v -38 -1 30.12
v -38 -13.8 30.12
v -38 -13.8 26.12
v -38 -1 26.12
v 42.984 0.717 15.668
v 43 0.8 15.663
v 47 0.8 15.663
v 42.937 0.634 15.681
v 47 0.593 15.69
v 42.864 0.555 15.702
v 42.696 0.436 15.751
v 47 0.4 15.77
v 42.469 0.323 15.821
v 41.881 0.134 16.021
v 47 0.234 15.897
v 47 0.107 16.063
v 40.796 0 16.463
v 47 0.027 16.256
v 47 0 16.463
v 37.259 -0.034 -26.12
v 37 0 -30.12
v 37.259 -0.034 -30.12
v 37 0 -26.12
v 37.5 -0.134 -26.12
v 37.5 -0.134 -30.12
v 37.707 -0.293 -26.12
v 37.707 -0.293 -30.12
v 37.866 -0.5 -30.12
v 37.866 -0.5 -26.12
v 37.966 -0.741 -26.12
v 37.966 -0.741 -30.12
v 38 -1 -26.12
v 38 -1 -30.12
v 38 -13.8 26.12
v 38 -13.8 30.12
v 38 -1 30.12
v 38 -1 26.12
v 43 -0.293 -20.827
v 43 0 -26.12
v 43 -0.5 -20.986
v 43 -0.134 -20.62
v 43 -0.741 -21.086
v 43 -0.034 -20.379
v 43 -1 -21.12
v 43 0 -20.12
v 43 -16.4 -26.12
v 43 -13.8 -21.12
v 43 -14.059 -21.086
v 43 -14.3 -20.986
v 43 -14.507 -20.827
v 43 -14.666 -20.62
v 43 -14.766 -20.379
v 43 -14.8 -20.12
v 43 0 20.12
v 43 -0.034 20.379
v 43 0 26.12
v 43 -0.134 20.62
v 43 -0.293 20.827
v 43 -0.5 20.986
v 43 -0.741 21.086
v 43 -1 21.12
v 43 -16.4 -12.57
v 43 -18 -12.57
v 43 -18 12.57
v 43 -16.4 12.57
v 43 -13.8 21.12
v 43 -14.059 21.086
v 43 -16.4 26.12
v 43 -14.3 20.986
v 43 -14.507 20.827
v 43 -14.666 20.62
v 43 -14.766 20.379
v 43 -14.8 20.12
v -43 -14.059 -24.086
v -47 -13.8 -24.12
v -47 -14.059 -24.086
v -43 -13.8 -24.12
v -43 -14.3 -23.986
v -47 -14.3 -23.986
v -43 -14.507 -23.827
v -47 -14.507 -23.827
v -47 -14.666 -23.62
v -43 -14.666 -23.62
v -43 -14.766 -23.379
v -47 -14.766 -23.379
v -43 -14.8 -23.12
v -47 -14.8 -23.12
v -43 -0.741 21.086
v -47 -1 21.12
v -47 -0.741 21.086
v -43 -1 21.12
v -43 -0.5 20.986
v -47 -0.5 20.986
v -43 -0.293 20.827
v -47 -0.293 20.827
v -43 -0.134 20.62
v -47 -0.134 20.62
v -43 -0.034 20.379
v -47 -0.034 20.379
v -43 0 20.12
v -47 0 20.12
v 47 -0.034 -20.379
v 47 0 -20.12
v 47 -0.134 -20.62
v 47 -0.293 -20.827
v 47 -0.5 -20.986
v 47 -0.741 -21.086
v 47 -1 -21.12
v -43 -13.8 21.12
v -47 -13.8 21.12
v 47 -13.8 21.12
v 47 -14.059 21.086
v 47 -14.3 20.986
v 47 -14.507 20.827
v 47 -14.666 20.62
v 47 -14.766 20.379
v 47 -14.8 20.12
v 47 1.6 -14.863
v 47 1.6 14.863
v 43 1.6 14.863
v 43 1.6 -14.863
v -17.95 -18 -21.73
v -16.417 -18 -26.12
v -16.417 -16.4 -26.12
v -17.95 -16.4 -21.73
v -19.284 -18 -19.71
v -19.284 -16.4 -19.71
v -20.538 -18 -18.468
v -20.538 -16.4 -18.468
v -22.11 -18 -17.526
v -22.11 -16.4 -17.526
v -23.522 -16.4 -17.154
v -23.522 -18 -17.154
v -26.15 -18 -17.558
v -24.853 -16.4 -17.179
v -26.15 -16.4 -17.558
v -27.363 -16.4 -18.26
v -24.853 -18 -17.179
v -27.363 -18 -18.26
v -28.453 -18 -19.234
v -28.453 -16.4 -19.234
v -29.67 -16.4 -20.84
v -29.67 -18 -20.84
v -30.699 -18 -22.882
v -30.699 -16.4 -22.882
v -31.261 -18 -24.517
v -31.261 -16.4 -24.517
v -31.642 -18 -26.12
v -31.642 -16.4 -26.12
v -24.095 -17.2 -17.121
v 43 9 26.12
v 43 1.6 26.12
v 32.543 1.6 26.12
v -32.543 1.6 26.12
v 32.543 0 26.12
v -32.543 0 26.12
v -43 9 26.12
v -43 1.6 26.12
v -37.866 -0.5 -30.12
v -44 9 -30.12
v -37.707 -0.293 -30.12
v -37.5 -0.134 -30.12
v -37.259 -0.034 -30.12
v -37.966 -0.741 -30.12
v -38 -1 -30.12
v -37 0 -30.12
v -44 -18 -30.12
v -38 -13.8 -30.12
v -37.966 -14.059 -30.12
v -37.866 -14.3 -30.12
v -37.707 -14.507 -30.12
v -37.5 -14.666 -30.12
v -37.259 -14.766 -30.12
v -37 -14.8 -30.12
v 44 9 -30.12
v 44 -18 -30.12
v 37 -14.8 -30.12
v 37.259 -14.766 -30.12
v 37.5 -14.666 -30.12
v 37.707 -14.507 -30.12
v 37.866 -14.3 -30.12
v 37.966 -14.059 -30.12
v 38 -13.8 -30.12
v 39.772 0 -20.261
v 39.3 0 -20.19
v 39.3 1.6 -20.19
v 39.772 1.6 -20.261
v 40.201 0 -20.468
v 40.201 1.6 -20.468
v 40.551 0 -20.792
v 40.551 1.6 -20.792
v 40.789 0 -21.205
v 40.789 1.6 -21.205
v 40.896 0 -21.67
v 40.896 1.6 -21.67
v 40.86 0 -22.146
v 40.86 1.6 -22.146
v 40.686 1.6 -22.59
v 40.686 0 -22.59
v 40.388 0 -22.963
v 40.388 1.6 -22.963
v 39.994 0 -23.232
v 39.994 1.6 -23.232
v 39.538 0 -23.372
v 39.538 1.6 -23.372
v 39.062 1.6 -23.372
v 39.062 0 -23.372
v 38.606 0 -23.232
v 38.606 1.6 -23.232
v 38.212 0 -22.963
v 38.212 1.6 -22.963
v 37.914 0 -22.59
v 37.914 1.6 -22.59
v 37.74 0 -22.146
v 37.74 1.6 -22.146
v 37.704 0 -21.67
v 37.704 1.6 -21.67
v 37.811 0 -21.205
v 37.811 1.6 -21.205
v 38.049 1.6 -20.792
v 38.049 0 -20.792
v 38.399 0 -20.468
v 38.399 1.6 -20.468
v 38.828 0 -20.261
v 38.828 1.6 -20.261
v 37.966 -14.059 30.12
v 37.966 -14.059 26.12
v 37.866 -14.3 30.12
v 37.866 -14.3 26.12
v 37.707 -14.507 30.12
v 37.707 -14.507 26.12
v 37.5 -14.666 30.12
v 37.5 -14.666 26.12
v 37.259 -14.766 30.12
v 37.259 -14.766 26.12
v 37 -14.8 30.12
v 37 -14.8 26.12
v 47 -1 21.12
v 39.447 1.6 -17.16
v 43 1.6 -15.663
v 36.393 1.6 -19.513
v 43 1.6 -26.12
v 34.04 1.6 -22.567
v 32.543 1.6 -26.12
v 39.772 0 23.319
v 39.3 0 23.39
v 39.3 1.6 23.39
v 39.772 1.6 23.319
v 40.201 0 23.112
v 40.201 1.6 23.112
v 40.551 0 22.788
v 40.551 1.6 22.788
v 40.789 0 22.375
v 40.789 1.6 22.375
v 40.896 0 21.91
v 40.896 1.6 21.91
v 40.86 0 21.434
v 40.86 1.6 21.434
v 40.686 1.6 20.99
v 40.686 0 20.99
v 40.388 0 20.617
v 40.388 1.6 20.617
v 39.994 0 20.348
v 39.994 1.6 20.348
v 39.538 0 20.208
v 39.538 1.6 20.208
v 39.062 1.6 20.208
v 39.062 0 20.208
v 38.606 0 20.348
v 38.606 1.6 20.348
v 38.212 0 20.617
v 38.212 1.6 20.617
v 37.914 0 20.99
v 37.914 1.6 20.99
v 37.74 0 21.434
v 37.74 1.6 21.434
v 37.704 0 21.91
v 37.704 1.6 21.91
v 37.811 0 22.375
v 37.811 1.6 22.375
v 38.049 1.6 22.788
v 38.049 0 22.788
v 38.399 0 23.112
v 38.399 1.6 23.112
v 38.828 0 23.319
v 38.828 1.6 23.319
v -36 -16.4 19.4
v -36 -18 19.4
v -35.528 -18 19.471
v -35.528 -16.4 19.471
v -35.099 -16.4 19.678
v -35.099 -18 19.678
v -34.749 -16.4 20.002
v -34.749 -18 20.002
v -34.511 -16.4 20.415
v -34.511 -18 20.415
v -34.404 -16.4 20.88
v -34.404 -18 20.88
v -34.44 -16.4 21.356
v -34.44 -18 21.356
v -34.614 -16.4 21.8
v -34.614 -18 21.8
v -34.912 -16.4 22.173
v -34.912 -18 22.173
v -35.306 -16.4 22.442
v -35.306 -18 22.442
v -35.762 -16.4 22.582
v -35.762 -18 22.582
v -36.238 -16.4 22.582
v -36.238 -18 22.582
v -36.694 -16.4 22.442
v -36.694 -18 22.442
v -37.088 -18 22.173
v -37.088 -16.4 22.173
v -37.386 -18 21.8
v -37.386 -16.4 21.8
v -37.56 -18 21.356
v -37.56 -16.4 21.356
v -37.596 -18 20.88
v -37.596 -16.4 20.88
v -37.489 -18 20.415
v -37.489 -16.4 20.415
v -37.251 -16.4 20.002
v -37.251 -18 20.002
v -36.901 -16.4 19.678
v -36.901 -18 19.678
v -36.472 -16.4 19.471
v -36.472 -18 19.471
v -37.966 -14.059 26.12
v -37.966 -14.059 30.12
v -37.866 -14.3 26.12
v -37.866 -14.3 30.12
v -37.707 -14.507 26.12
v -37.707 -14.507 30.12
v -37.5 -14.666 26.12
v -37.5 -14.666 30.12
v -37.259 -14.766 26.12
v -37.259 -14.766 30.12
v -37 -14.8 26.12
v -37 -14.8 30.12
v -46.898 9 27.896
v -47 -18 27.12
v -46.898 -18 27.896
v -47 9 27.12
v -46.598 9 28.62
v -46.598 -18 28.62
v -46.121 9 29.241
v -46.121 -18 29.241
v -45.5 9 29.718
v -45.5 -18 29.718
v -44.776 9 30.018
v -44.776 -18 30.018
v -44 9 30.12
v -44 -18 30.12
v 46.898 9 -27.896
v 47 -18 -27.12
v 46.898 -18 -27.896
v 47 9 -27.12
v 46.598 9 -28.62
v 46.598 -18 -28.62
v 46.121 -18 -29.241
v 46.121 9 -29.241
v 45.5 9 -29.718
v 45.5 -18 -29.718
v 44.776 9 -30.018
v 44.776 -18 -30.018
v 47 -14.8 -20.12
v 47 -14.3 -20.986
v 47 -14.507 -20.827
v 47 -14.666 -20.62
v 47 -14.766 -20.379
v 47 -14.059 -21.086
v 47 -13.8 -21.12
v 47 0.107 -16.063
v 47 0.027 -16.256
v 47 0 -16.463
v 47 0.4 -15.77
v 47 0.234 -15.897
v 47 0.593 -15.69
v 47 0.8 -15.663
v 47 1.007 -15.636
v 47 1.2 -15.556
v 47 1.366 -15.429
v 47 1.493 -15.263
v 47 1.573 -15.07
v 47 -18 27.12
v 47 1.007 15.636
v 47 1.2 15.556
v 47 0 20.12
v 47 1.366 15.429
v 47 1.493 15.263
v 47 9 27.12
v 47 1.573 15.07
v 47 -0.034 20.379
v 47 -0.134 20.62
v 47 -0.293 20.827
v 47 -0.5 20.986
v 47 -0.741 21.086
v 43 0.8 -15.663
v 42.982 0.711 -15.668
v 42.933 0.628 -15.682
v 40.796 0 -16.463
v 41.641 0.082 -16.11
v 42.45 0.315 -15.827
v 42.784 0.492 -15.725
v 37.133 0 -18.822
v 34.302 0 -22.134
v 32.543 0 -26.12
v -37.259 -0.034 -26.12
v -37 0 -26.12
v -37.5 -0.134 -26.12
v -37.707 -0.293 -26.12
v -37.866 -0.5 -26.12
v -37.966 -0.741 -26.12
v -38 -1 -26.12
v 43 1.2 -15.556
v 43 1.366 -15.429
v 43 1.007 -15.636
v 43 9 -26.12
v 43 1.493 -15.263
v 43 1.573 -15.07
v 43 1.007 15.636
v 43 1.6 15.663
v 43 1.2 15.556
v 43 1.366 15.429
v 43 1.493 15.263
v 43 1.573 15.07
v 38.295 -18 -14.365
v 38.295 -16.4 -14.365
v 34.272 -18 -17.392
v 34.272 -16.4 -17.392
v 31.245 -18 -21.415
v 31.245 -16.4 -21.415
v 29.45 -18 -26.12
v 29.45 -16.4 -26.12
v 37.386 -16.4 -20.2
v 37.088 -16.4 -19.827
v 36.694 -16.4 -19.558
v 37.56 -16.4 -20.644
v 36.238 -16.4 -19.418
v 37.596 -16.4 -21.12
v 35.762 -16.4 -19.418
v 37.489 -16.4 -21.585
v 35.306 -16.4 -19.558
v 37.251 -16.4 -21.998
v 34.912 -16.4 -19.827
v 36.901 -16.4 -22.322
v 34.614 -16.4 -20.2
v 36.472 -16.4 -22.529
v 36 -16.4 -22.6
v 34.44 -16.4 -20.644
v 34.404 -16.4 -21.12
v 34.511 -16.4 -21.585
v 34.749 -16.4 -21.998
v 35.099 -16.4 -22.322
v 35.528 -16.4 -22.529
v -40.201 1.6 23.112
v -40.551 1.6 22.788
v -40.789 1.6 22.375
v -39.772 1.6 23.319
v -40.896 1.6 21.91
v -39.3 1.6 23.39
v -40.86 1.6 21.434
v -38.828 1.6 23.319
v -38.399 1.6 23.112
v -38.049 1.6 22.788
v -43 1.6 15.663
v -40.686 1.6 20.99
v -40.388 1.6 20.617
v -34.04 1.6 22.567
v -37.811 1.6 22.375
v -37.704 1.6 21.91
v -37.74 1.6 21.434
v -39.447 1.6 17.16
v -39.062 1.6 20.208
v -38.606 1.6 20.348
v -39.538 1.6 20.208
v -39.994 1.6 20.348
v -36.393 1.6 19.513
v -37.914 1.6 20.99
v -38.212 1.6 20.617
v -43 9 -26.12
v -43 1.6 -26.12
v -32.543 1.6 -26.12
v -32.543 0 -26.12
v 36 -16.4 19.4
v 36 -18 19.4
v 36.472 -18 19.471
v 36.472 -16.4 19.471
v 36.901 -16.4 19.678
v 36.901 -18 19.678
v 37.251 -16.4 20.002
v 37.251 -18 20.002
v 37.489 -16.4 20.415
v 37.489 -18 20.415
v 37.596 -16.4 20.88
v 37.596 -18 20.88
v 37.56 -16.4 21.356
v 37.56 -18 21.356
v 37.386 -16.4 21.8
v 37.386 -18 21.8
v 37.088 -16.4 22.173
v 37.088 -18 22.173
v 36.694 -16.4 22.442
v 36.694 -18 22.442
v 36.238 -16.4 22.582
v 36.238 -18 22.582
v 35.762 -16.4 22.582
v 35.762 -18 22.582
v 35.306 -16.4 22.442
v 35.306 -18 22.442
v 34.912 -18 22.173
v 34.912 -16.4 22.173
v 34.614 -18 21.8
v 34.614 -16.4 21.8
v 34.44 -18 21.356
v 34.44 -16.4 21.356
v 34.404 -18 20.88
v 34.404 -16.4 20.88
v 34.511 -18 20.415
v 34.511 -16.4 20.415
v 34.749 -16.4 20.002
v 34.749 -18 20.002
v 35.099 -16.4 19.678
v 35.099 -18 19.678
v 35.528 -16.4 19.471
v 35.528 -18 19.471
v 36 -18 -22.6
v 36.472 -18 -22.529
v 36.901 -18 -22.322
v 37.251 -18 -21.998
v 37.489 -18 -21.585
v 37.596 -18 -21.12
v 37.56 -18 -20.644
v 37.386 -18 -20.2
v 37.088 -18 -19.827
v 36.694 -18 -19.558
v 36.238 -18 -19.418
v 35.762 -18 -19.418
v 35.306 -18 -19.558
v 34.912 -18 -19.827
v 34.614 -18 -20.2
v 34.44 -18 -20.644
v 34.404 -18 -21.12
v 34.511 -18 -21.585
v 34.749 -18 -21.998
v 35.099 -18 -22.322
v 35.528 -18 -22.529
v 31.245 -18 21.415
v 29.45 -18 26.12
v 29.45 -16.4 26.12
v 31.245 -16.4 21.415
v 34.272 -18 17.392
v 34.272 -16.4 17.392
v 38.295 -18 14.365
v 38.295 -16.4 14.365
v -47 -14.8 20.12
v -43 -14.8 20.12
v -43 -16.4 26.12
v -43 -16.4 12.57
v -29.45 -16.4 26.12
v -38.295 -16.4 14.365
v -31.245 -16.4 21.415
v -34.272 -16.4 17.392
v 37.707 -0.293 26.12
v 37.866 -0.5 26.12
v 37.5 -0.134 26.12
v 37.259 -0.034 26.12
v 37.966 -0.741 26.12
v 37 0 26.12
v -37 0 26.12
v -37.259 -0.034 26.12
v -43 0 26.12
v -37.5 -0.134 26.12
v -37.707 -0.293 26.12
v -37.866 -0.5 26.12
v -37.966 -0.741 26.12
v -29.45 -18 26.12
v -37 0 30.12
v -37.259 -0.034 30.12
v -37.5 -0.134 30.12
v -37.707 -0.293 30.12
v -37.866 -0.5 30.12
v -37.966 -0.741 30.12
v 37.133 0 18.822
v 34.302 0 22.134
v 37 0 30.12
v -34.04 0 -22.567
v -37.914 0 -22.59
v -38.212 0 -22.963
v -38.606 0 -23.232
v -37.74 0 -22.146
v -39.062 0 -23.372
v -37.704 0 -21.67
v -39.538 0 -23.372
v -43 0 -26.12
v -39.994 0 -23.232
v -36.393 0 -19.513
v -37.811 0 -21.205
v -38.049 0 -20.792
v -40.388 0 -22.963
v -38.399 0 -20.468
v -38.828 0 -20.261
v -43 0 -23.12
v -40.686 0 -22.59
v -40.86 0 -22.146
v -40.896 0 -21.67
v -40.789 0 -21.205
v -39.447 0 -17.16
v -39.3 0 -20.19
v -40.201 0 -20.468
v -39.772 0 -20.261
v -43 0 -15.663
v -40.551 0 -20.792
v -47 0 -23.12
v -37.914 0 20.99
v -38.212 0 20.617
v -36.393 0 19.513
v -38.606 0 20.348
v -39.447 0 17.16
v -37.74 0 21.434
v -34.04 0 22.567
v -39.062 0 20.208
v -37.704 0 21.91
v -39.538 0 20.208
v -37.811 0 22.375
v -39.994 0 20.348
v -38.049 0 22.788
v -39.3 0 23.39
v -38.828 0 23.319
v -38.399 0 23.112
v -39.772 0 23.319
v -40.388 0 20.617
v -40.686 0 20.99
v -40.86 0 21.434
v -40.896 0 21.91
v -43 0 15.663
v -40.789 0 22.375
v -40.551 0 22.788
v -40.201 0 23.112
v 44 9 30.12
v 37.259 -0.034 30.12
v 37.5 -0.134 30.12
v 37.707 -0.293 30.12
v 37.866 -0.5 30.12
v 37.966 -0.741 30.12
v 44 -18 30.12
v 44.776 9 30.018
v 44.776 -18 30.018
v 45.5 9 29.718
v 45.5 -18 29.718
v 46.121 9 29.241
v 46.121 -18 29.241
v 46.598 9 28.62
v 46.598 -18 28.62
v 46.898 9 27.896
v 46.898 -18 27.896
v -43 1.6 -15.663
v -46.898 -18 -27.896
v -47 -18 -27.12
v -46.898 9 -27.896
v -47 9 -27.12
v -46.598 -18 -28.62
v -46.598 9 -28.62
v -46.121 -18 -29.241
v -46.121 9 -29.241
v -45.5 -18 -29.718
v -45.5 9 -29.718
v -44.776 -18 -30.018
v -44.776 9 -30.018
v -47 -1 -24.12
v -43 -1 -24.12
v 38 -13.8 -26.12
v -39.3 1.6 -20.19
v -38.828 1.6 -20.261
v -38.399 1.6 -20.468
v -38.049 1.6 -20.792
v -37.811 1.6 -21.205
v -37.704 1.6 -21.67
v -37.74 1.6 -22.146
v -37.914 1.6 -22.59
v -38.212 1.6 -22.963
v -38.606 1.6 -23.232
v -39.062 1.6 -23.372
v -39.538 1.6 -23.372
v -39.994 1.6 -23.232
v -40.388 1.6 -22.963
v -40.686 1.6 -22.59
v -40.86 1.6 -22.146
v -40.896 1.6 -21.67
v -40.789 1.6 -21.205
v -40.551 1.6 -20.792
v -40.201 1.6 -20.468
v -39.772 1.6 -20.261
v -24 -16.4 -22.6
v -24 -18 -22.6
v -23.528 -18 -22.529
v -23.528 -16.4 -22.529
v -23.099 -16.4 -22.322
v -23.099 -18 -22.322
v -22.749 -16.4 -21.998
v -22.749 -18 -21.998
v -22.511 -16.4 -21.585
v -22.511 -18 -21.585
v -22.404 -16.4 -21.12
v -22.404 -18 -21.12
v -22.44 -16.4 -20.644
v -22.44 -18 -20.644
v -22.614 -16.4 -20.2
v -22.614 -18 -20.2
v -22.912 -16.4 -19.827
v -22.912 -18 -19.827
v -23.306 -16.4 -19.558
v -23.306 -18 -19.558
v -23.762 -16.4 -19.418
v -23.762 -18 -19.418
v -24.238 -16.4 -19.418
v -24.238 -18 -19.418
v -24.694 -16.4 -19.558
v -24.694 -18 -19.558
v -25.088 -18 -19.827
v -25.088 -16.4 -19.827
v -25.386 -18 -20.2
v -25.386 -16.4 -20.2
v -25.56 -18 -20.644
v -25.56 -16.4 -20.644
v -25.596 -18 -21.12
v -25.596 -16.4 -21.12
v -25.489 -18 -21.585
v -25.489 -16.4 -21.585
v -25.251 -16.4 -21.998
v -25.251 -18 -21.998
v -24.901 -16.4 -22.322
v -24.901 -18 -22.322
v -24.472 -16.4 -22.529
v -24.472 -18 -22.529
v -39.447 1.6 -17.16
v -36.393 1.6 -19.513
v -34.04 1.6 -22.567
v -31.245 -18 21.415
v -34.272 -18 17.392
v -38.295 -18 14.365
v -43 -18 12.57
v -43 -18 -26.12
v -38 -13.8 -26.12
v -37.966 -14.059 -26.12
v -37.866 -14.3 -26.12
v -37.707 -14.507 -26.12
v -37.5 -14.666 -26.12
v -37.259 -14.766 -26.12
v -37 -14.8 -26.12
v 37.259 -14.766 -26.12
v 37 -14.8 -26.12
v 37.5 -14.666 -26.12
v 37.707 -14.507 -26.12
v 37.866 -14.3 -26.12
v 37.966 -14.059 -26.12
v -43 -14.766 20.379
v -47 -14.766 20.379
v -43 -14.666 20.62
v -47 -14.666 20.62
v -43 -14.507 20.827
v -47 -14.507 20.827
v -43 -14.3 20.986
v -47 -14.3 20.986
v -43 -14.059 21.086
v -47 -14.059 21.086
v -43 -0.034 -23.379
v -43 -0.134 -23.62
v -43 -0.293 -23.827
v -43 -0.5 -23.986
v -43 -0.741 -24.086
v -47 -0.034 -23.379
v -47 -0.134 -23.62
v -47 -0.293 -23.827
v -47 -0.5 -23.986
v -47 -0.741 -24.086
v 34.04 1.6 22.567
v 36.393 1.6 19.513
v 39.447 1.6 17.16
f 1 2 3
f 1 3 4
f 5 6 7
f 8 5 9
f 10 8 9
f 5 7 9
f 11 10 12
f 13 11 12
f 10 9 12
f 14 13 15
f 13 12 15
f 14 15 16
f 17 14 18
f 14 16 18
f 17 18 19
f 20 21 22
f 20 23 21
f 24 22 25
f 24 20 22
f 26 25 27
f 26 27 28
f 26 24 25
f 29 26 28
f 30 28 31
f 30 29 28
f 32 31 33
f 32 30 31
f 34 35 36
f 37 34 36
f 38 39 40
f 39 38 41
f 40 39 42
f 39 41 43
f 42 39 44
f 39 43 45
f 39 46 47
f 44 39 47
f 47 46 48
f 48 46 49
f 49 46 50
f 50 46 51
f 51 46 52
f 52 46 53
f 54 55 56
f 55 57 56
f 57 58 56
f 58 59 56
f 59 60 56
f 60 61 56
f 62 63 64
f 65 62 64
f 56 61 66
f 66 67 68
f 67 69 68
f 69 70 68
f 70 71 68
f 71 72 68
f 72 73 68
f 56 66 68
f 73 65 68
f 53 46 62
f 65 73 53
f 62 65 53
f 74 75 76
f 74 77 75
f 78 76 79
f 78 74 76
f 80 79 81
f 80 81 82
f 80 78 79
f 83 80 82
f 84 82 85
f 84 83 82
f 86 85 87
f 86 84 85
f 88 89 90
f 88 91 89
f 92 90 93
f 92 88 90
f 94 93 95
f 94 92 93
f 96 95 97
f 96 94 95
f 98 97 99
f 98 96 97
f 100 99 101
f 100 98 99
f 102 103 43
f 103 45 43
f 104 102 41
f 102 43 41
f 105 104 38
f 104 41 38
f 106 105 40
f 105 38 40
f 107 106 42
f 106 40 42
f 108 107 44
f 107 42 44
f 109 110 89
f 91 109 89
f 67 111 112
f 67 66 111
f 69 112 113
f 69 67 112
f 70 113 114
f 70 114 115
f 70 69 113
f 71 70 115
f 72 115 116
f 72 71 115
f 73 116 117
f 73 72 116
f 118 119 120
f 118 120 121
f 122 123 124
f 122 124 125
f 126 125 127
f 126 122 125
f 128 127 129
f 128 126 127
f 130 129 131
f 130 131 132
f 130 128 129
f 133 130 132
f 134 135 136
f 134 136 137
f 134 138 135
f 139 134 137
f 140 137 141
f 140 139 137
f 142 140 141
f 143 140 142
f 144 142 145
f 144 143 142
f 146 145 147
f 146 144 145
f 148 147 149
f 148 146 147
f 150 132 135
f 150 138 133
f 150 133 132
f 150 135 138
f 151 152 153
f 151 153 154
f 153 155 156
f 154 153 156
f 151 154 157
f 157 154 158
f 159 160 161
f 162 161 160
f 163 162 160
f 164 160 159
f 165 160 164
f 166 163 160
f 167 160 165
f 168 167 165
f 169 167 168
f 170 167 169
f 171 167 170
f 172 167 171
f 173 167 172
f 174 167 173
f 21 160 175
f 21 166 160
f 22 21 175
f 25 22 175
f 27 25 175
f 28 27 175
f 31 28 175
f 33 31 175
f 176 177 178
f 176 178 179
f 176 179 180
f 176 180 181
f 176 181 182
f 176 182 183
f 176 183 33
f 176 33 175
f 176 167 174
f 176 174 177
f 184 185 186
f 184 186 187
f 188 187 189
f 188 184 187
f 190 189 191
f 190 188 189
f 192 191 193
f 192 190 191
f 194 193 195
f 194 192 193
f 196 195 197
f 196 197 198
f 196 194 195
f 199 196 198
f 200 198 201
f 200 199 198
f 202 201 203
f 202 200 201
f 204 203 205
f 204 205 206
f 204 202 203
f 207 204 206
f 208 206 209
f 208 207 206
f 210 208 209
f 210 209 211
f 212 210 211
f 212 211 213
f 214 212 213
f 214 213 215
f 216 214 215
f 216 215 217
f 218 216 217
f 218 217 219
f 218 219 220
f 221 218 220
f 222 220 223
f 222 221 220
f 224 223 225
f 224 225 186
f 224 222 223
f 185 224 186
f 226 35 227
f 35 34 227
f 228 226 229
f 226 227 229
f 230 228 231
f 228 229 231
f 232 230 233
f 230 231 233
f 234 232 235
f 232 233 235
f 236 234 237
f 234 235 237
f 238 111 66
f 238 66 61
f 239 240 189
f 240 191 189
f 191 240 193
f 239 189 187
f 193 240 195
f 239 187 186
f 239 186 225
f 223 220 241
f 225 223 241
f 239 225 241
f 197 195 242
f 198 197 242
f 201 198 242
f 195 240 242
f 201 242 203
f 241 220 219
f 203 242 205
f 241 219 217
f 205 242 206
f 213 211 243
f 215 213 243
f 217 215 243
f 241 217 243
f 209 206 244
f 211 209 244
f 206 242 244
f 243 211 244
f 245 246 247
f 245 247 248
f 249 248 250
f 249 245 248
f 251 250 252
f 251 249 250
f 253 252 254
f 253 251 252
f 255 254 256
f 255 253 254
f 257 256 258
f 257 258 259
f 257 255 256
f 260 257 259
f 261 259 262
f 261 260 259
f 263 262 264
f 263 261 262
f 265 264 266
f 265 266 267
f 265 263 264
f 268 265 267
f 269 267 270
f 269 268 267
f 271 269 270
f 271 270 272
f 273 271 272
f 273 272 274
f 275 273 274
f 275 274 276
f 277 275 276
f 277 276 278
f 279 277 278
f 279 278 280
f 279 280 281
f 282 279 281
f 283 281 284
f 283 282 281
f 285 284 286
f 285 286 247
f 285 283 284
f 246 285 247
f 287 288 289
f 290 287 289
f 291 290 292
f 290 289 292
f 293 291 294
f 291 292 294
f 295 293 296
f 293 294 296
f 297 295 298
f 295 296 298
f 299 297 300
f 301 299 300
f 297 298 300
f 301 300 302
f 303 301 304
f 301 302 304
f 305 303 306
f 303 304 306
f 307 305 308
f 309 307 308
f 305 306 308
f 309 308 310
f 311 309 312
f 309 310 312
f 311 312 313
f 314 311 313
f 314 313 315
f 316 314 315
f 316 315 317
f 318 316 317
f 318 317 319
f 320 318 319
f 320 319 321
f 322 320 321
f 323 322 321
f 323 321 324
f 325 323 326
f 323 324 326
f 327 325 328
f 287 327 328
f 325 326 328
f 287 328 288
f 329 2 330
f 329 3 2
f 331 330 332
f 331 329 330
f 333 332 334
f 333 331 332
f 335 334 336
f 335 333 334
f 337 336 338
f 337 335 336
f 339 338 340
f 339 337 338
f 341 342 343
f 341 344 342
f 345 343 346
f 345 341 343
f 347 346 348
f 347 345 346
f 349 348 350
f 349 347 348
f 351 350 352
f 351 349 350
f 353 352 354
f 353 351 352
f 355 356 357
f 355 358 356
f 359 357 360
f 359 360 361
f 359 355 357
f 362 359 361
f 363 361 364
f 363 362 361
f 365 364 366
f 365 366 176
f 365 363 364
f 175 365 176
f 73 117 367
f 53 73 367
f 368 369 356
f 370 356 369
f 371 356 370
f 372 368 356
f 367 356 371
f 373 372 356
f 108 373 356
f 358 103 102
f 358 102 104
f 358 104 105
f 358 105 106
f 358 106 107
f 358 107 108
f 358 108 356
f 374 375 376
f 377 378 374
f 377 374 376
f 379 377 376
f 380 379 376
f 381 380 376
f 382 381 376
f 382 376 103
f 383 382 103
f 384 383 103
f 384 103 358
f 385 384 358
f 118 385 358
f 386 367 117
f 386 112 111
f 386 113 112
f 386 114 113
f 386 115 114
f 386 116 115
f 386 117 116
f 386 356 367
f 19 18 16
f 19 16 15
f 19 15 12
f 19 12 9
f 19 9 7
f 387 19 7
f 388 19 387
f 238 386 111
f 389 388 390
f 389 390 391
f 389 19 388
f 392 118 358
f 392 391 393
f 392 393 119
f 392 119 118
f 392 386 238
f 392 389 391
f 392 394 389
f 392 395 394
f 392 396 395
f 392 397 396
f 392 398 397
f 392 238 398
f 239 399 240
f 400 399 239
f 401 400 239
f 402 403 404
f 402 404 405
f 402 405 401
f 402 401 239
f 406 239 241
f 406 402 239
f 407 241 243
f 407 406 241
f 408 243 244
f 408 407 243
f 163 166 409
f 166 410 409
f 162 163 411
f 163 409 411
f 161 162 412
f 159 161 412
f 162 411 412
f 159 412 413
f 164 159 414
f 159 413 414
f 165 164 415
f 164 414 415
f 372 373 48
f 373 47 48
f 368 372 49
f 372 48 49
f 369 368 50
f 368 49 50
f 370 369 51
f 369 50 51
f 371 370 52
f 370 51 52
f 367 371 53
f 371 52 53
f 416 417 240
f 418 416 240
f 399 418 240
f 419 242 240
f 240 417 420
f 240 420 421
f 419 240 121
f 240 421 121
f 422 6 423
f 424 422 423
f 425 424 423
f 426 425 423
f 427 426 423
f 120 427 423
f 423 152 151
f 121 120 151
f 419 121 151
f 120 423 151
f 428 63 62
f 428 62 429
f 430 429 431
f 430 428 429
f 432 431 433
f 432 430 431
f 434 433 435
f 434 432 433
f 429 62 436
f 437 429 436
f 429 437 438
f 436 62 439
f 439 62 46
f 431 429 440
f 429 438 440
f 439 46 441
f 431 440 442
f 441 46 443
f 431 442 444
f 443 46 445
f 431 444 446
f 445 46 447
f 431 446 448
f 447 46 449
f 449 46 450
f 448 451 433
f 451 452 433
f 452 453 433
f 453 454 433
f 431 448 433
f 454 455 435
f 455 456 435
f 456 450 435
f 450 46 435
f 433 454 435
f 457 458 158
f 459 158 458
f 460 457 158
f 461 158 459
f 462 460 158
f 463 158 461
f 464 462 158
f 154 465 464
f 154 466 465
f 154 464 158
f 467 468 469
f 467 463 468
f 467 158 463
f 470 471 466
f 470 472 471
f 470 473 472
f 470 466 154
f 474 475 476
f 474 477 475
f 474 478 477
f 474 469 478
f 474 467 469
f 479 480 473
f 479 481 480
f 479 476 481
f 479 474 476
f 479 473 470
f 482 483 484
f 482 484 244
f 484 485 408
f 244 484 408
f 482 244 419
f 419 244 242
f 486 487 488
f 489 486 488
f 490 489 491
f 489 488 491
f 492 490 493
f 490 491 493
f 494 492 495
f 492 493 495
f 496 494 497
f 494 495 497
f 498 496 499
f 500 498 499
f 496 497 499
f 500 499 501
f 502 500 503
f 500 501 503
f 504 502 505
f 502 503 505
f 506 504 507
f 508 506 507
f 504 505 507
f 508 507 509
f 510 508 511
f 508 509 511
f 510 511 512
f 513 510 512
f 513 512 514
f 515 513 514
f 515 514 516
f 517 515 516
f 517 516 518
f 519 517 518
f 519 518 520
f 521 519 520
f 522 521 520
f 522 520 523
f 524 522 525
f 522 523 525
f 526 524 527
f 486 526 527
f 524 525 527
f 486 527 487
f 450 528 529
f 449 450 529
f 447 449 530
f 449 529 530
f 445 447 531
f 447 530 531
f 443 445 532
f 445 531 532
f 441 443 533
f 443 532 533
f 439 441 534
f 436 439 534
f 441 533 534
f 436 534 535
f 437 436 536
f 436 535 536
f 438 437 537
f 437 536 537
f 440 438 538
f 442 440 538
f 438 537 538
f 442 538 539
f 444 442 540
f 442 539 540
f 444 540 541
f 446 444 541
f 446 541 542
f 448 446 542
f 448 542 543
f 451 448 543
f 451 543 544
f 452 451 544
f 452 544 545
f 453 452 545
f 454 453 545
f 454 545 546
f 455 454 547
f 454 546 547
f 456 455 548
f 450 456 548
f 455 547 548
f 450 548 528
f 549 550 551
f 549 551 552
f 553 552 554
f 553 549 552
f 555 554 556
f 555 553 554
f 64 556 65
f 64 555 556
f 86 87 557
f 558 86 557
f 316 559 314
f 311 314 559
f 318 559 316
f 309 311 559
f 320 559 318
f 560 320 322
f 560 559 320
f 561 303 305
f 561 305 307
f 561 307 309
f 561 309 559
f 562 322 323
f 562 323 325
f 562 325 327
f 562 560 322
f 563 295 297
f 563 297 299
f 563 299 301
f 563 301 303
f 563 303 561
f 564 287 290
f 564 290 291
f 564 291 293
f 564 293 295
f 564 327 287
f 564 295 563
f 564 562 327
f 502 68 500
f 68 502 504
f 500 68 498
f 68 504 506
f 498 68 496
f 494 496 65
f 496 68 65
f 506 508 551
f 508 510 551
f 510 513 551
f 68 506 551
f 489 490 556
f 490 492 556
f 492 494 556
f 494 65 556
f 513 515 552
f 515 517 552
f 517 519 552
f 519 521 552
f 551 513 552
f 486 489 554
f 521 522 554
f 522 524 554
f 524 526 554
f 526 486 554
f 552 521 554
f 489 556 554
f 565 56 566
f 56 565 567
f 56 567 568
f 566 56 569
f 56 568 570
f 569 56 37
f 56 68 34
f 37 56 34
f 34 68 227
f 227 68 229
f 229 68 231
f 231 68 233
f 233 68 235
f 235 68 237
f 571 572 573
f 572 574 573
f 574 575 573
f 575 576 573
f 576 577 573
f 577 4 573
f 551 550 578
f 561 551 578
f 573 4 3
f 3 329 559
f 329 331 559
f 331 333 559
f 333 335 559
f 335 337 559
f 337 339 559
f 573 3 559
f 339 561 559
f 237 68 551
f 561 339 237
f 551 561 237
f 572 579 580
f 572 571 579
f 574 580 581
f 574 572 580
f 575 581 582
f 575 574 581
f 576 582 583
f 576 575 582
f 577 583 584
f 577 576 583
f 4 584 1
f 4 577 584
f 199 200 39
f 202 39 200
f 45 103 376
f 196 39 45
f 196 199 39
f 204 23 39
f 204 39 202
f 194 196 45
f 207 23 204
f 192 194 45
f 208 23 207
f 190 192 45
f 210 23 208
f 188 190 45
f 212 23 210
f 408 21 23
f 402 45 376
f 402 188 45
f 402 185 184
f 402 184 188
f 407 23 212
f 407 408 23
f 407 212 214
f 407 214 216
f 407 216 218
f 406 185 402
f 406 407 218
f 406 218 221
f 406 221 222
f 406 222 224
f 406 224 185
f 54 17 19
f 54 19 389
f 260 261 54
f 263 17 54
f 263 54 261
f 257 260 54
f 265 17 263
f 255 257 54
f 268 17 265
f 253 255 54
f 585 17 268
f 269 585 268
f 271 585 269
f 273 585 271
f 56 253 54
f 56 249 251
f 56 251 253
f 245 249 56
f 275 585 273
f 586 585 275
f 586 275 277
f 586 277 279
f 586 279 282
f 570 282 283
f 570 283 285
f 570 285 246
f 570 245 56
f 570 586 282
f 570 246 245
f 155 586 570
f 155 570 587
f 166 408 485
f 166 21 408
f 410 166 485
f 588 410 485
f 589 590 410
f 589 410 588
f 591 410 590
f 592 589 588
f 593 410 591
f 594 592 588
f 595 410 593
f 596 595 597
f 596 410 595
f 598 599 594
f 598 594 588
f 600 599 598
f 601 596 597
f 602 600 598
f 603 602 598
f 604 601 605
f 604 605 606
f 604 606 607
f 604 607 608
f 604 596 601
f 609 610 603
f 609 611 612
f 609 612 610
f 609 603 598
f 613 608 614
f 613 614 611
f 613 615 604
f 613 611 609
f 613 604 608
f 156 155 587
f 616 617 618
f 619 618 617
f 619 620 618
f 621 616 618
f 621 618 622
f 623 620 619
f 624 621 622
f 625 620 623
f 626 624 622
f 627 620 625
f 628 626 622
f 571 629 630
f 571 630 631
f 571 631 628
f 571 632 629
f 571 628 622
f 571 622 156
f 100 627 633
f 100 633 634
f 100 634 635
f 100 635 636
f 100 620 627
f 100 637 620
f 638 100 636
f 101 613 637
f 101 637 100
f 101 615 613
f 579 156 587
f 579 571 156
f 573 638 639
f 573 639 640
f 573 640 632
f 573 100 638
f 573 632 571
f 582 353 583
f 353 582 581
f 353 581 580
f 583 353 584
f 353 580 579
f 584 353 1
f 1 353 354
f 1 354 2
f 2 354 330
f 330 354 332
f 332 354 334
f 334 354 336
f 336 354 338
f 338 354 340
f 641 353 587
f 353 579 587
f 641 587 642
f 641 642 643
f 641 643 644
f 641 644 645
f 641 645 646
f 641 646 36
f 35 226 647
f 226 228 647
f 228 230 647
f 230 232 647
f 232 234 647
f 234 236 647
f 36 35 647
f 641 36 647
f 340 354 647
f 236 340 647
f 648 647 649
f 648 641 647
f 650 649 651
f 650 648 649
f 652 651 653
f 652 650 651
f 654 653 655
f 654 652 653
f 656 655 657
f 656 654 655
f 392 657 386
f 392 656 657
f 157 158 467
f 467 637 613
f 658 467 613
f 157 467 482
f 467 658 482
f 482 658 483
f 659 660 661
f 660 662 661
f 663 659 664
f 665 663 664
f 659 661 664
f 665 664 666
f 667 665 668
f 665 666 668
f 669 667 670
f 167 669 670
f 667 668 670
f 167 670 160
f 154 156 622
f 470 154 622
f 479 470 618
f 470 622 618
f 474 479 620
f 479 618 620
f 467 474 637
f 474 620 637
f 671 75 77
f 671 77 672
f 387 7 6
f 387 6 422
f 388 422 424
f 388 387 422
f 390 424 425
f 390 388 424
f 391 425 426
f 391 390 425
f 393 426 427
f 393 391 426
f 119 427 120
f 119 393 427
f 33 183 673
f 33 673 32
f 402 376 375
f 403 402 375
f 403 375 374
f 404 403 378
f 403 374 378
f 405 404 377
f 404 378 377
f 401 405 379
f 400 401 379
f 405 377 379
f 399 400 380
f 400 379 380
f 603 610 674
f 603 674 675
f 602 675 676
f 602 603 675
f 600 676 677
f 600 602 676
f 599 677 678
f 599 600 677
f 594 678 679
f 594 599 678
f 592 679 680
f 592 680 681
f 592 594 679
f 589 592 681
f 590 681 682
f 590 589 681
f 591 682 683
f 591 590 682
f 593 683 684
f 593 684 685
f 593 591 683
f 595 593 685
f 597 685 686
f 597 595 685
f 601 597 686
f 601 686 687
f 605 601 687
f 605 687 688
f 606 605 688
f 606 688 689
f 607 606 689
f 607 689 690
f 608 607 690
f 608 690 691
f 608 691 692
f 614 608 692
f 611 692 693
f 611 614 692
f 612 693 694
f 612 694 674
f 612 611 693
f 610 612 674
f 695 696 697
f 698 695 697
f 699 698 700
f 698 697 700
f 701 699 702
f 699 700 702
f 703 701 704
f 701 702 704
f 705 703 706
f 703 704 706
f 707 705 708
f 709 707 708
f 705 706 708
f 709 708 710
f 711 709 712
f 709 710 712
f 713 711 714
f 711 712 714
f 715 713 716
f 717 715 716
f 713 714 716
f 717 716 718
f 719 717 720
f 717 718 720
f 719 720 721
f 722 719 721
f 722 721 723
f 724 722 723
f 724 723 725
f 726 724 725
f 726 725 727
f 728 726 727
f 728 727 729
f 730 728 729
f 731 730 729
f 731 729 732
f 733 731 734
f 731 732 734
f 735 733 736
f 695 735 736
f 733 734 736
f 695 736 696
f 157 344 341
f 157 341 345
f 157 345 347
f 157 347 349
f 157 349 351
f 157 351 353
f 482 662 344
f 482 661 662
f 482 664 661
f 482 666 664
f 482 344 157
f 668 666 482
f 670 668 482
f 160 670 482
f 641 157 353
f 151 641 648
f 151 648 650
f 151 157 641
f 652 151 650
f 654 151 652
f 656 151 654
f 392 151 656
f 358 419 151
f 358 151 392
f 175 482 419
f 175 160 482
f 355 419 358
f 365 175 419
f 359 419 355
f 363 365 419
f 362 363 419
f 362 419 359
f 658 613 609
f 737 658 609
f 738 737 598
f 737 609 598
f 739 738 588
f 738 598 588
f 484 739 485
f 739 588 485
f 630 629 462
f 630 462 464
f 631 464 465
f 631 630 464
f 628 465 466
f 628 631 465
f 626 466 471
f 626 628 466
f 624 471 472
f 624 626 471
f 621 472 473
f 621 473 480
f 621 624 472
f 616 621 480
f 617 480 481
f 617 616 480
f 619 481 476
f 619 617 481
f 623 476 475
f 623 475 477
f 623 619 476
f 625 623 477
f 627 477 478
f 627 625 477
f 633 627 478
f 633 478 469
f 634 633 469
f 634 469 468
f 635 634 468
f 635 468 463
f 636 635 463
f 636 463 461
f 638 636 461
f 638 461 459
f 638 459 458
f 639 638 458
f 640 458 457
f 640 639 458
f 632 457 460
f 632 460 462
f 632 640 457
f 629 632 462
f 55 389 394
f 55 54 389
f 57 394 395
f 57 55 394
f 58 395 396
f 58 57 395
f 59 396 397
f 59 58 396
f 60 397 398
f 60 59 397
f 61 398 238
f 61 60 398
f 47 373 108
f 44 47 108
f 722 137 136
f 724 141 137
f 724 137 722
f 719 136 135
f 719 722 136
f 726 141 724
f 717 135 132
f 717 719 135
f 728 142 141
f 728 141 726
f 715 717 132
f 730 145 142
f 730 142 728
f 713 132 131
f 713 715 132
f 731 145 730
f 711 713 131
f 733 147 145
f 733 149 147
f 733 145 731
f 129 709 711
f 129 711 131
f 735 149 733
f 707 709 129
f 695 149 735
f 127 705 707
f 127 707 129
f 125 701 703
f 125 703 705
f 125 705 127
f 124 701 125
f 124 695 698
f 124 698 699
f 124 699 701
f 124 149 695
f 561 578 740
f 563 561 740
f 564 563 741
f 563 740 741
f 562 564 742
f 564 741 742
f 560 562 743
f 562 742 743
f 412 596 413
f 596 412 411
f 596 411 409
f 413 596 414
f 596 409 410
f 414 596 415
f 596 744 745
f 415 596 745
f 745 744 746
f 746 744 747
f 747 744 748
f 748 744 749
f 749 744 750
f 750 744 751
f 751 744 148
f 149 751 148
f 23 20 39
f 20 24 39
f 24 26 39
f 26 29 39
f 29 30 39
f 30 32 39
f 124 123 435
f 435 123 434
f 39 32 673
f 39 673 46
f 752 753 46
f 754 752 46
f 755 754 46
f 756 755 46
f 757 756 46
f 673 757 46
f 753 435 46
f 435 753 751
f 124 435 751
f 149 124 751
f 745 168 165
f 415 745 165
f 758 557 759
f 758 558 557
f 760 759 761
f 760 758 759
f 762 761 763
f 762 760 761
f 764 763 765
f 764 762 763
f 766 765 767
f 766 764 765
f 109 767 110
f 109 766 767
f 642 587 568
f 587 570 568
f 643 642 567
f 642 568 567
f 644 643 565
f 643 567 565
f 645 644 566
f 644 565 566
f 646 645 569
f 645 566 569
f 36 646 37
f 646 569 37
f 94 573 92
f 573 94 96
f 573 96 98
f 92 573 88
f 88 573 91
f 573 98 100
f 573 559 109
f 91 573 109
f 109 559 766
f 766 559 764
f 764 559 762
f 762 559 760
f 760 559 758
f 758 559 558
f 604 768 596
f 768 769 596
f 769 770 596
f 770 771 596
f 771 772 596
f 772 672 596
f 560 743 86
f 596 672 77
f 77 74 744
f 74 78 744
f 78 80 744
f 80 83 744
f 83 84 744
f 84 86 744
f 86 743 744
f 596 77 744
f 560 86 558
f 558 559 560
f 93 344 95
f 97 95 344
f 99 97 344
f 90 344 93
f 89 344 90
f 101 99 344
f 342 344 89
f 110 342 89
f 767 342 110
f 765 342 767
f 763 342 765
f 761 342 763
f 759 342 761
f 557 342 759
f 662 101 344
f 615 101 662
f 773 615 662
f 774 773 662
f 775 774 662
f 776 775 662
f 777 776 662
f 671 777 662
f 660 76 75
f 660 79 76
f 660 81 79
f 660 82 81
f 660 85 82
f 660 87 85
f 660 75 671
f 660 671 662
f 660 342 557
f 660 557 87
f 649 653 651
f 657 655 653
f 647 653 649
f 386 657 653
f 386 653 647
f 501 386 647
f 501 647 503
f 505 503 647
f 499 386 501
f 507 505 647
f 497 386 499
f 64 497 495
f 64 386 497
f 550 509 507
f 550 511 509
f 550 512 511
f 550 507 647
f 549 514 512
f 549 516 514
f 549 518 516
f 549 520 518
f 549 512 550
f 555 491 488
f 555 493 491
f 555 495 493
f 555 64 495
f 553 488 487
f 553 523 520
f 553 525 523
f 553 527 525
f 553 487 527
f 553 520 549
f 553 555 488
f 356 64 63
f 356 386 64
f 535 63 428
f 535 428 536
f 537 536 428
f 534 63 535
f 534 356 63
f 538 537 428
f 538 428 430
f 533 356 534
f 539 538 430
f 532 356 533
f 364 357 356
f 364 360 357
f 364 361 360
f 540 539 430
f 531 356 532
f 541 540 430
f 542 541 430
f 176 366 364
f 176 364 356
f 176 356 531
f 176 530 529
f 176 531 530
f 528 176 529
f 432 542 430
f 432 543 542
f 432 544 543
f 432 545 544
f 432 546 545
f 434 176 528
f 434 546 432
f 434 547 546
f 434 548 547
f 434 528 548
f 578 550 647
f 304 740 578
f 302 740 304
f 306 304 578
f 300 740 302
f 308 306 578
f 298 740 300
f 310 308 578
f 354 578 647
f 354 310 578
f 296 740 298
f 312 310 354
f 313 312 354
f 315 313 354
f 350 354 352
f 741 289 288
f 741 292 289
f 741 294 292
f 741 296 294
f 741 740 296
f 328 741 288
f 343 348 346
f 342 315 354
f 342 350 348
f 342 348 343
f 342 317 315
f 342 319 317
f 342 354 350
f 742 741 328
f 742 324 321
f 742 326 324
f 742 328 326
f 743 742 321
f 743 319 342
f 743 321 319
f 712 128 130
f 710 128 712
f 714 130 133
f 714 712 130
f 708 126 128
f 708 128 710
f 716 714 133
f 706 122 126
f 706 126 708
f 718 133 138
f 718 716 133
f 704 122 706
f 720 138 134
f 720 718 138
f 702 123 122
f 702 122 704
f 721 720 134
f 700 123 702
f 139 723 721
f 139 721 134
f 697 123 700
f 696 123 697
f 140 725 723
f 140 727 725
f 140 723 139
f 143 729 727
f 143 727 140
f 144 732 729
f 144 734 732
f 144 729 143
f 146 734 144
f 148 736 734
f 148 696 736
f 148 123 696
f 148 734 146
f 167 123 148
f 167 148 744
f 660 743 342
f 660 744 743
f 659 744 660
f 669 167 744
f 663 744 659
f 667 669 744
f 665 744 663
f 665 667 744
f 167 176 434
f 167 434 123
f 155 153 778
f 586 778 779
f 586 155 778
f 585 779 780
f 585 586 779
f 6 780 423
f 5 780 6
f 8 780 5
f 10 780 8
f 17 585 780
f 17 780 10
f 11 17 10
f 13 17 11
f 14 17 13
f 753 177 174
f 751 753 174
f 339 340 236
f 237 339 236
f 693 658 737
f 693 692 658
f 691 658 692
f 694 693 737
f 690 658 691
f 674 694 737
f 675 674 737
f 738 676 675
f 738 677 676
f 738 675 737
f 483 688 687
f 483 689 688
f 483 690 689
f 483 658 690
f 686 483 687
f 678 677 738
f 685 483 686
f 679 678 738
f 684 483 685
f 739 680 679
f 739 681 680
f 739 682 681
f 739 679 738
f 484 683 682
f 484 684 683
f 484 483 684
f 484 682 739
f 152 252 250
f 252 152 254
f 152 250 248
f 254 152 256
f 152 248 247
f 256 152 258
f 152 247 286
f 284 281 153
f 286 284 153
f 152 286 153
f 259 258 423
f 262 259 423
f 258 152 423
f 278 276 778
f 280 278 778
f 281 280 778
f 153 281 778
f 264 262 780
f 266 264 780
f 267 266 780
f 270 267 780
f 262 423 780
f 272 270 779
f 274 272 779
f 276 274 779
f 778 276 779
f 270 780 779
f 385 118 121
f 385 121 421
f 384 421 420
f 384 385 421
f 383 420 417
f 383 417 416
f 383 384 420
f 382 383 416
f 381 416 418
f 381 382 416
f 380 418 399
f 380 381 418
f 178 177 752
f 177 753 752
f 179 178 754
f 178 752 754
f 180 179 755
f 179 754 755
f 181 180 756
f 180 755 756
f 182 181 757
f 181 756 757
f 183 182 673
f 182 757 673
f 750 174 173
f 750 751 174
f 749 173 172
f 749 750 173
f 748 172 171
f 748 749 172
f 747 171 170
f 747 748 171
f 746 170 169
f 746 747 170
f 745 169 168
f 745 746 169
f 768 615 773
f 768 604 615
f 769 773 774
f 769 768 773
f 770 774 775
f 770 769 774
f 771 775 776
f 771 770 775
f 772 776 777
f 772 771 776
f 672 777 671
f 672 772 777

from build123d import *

# Parameters (mm, degrees)
EXTRUDE_1_DEPTH      = 9
EXTRUDE_1_DEPTH_BACK = 18
SKETCH_1_W           = 94
SKETCH_1_H           = 60.24
SKETCH_1_3_R         = 1.6
EXTRUDE_2_DEPTH      = 1.6
SKETCH_2_R           = 1.6
EXTRUDE_3_DEPTH      = 1.6
FILLET_1_R           = 3
SKETCH_3_W           = 42.24
SKETCH_3_H           = 14.8
CUT_EXTRUDE_1_DEPTH  = 4
SKETCH_4_W           = 42.24
SKETCH_4_H           = 14.8
CUT_EXTRUDE_2_DEPTH  = 4
SKETCH_5_W           = 76
SKETCH_5_H           = 14.8
CUT_EXTRUDE_3_DEPTH  = 4
SKETCH_6_W           = 76
SKETCH_6_H           = 14.8
CUT_EXTRUDE_4_DEPTH  = 4
FILLET_2_R           = 1
SKETCH_8_W           = 3
SKETCH_8_H           = 14.8
CUT_EXTRUDE_5_DEPTH  = 4
FILLET_3_R           = 1
SKETCH_9_W           = 31.32633541
SKETCH_9_H           = 1.6
CUT_EXTRUDE_6_DEPTH  = 4
FILLET_5_R           = 0.8


with BuildPart() as part:
    # 草图1 → 凸台-拉伸1 (new, two sides: drawn at the far end of the back side and taken through both)
    with BuildSketch(Plane(origin=(0, 0, 0), x_dir=(1, 0, 0), z_dir=(0, 1, 0)).offset(-EXTRUDE_1_DEPTH_BACK)):
        Rectangle(SKETCH_1_W, SKETCH_1_H)
        Polygon((-43, 15.663167705), (-43, 26.12), (-32.543167705, 26.12), (32.543167705, 26.12), (43, 26.12), (43, 15.663167705), (43, -15.663167705), (43, -26.12), (32.543167705, -26.12), (-32.543167705, -26.12), (-43, -26.12), (-43, -15.663167705), align=None, mode=Mode.SUBTRACT)
    extrude(amount=EXTRUDE_1_DEPTH + EXTRUDE_1_DEPTH_BACK)

    # 草图1<3> → 凸台-拉伸2 (add)
    # profile 1 of 4: a face of its own
    with BuildSketch(Plane(origin=(0, 0, 0), x_dir=(1, 0, 0), z_dir=(0, 1, 0))):
        with BuildLine():
            Line((-32.543167705, 26.12), (-43, 26.12))
            Line((-43, 26.12), (-43, 15.663167705))
            ThreePointArc((-43, 15.663167705), (-36.393398282, 19.513398282), (-32.543167705, 26.12))
        make_face()
        with Locations(Location((-39.3, 21.79, 0), (0, 0, 270))):
            Circle(SKETCH_1_3_R, mode=Mode.SUBTRACT)
    # profile 2 of 4: a face of its own
    with BuildSketch(Plane(origin=(0, 0, 0), x_dir=(1, 0, 0), z_dir=(0, 1, 0))):
        with BuildLine():
            Line((32.543167705, 26.12), (43, 26.12))
            Line((43, 26.12), (43, 15.663167705))
            ThreePointArc((43, 15.663167705), (36.393398282, 19.513398282), (32.543167705, 26.12))
        make_face()
        with Locations(Location((39.3, 21.79, 0), (0, 0, 270))):
            Circle(SKETCH_1_3_R, mode=Mode.SUBTRACT)
    # profile 3 of 4: a face of its own
    with BuildSketch(Plane(origin=(0, 0, 0), x_dir=(1, 0, 0), z_dir=(0, 1, 0))):
        with BuildLine():
            Line((43, -15.663167705), (43, -26.12))
            Line((43, -26.12), (32.543167705, -26.12))
            ThreePointArc((32.543167705, -26.12), (36.393398282, -19.513398282), (43, -15.663167705))
        make_face()
        with Locations(Location((39.3, -21.79, 0), (0, 0, 270))):
            Circle(SKETCH_1_3_R, mode=Mode.SUBTRACT)
    # profile 4 of 4: a face of its own
    with BuildSketch(Plane(origin=(0, 0, 0), x_dir=(1, 0, 0), z_dir=(0, 1, 0))):
        with BuildLine():
            ThreePointArc((-32.543167705, -26.12), (-36.393398282, -19.513398282), (-43, -15.663167705))
            Line((-43, -15.663167705), (-43, -26.12))
            Line((-43, -26.12), (-32.543167705, -26.12))
        make_face()
        with Locations(Location((-39.3, -21.79, 0), (0, 0, 270))):
            Circle(SKETCH_1_3_R, mode=Mode.SUBTRACT)
    extrude(amount=EXTRUDE_2_DEPTH)

    # 草图2 → 凸台-拉伸3 (add)
    # profile 1 of 4: a face of its own
    with BuildSketch(Plane(origin=(0, -18, 0), x_dir=(-1, 0, 0), z_dir=(0, -1, 0))):
        with BuildLine():
            Line((-43, 26.12), (-43, 12.570071225))
            ThreePointArc((-43, 12.570071225), (-34.272077939, 17.392077939), (-29.450071225, 26.12))
            Line((-29.450071225, 26.12), (-43, 26.12))
        make_face()
        with Locations(Location((-36, 21, 0), (0, 0, 90))):
            Circle(SKETCH_2_R, mode=Mode.SUBTRACT)
    # profile 2 of 4: a face of its own
    with BuildSketch(Plane(origin=(0, -18, 0), x_dir=(-1, 0, 0), z_dir=(0, -1, 0))):
        with BuildLine():
            Line((16.416573998, 26.12), (31.641993825, 26.12))
            add(Edge.make_bspline(
                [(16.416573998, 26.12), (24.309284633, -12.12635511), (31.641993825, 26.12)],
                knots=[1.876324373, 1.876324373, 1.876324373, 4.392355682, 4.392355682, 4.392355682], degree=2, weights=[1, 0.307705581, 1]))
        make_face()
        with Locations(Location((24, 21, 0), (0, 0, 90))):
            Circle(SKETCH_2_R, mode=Mode.SUBTRACT)
    # profile 3 of 4: a face of its own
    with BuildSketch(Plane(origin=(0, -18, 0), x_dir=(-1, 0, 0), z_dir=(0, -1, 0))):
        with BuildLine():
            Line((43, -12.570071225), (43, -26.12))
            Line((43, -26.12), (29.450071225, -26.12))
            ThreePointArc((29.450071225, -26.12), (34.272077939, -17.392077939), (43, -12.570071225))
        make_face()
        with Locations(Location((36, -21, 0), (0, 0, 90))):
            Circle(SKETCH_2_R, mode=Mode.SUBTRACT)
    # profile 4 of 4: a face of its own
    with BuildSketch(Plane(origin=(0, -18, 0), x_dir=(-1, 0, 0), z_dir=(0, -1, 0))):
        with BuildLine():
            Line((-43, -26.12), (-29.450071225, -26.12))
            ThreePointArc((-29.450071225, -26.12), (-34.272077939, -17.392077939), (-43, -12.570071225))
            Line((-43, -12.570071225), (-43, -26.12))
        make_face()
        with Locations(Location((-36, -21, 0), (0, 0, 90))):
            Circle(SKETCH_2_R, mode=Mode.SUBTRACT)
    extrude(amount=-EXTRUDE_3_DEPTH)

    # 圆角1
    fillet_1_edges = [part.edges().sort_by_distance(p)[0] for p in [
        (47, -4.5, 30.12),
        (-47, -4.5, 30.12),
        (-47, -4.5, -30.12),
        (47, -4.5, -30.12),
    ]]
    fillet(fillet_1_edges, radius=FILLET_1_R)

    # 草图3 → 切除-拉伸1 (cut)
    with BuildSketch(Plane.ZY.offset(47)):
        with Locations((0, -7.4)):
            Rectangle(SKETCH_3_W, SKETCH_3_H)
    extrude(amount=-CUT_EXTRUDE_1_DEPTH, mode=Mode.SUBTRACT)

    # 草图4 → 切除-拉伸2 (cut)
    with BuildSketch(Plane(origin=(47, 0, 0), x_dir=(0, 0, -1), z_dir=(1, 0, 0))):
        with Locations((0, -7.4)):
            Rectangle(SKETCH_4_W, SKETCH_4_H)
    extrude(amount=-CUT_EXTRUDE_2_DEPTH, mode=Mode.SUBTRACT)

    # 草图5 → 切除-拉伸3 (cut)
    with BuildSketch(Plane.XY.offset(30.12)):
        with Locations((0, -7.4)):
            Rectangle(SKETCH_5_W, SKETCH_5_H)
    extrude(amount=-CUT_EXTRUDE_3_DEPTH, mode=Mode.SUBTRACT)

    # 草图6 → 切除-拉伸4 (cut)
    with BuildSketch(Plane(origin=(0, 0, -30.12), x_dir=(-1, 0, 0), z_dir=(0, 0, -1))):
        with Locations((0, -7.4)):
            Rectangle(SKETCH_6_W, SKETCH_6_H)
    extrude(amount=-CUT_EXTRUDE_4_DEPTH, mode=Mode.SUBTRACT)

    # 圆角2
    fillet_2_edges = [part.edges().sort_by_distance(p)[0] for p in [
        (-45, 0, 21.12),
        (-45, -14.8, 21.12),
        (45, 0, -21.12),
        (45, -14.8, -21.12),
        (45, -14.8, 21.12),
        (45, 0, 21.12),
        (38, 0, 28.12),
        (38, -14.8, 28.12),
        (-38, -14.8, 28.12),
        (-38, 0, 28.12),
        (-38, 0, -28.12),
        (-38, -14.8, -28.12),
        (38, -14.8, -28.12),
        (38, 0, -28.12),
    ]]
    fillet(fillet_2_edges, radius=FILLET_2_R)

    # 草图8 → 切除-拉伸5 (cut)
    with BuildSketch(Plane.ZY.offset(47)):
        with Locations((-22.62, -7.4)):
            Rectangle(SKETCH_8_W, SKETCH_8_H)
    extrude(amount=-CUT_EXTRUDE_5_DEPTH, mode=Mode.SUBTRACT)

    # 圆角3
    fillet_3_edges = [part.edges().sort_by_distance(p)[0] for p in [
        (-45, -14.8, -24.12),
        (-45, 0, -24.12),
    ]]
    fillet(fillet_3_edges, radius=FILLET_3_R)

    # 草图9 → 切除-拉伸6 (cut)
    with BuildSketch(Plane(origin=(47, 0, 0), x_dir=(0, 0, -1), z_dir=(1, 0, 0))):
        with Locations((0, 0.8)):
            Rectangle(SKETCH_9_W, SKETCH_9_H)
    extrude(amount=-CUT_EXTRUDE_6_DEPTH, mode=Mode.SUBTRACT)

    # 圆角5
    # the kernel refuses this fillet: 0.8 mm, written as the material it adds along each edge
    with BuildSketch(Plane(origin=(47, 1.6, 15.663167705), x_dir=(0, -1, 0), z_dir=(-1, 0, 0))) as fillet_5_piece_1:
        with BuildLine():
            CenterArc((FILLET_5_R, -FILLET_5_R), FILLET_5_R, 90, 90)
            Line((0, -FILLET_5_R), (0, 0))
            Line((0, 0), (FILLET_5_R, 0))
        make_face()
    extrude(amount=4)
    with BuildSketch(Plane(origin=(47, 1.6, -15.663167705), x_dir=(0, -1, 0), z_dir=(-1, 0, 0))) as fillet_5_piece_2:
        with BuildLine():
            CenterArc((FILLET_5_R, FILLET_5_R), FILLET_5_R, 180, 90)
            Line((0, FILLET_5_R), (0, 0))
            Line((0, 0), (FILLET_5_R, 0))
        make_face()
    extrude(amount=4)
    # the kernel refuses this fillet: 0.8 mm, written as the material it takes off along each edge
    with BuildSketch(Plane(origin=(49, 0, -15.663167705), x_dir=(0, 0, -1), z_dir=(-1, 0, 0))) as fillet_5_2_piece_1:
        with BuildLine():
            CenterArc((FILLET_5_R, -FILLET_5_R), FILLET_5_R, 90, 90)
            Line((0, -FILLET_5_R), (0, 0))
            Line((0, 0), (FILLET_5_R, 0))
        make_face()
    extrude(amount=9.4, mode=Mode.SUBTRACT)
    with BuildSketch(Plane(origin=(49, 0, 15.663167705), x_dir=(0, 0, 1), z_dir=(-1, 0, 0))) as fillet_5_2_piece_2:
        with BuildLine():
            CenterArc((FILLET_5_R, FILLET_5_R), FILLET_5_R, 180, 90)
            Line((0, FILLET_5_R), (0, 0))
            Line((0, 0), (FILLET_5_R, 0))
        make_face()
    extrude(amount=9.4, mode=Mode.SUBTRACT)


solid = part.part
